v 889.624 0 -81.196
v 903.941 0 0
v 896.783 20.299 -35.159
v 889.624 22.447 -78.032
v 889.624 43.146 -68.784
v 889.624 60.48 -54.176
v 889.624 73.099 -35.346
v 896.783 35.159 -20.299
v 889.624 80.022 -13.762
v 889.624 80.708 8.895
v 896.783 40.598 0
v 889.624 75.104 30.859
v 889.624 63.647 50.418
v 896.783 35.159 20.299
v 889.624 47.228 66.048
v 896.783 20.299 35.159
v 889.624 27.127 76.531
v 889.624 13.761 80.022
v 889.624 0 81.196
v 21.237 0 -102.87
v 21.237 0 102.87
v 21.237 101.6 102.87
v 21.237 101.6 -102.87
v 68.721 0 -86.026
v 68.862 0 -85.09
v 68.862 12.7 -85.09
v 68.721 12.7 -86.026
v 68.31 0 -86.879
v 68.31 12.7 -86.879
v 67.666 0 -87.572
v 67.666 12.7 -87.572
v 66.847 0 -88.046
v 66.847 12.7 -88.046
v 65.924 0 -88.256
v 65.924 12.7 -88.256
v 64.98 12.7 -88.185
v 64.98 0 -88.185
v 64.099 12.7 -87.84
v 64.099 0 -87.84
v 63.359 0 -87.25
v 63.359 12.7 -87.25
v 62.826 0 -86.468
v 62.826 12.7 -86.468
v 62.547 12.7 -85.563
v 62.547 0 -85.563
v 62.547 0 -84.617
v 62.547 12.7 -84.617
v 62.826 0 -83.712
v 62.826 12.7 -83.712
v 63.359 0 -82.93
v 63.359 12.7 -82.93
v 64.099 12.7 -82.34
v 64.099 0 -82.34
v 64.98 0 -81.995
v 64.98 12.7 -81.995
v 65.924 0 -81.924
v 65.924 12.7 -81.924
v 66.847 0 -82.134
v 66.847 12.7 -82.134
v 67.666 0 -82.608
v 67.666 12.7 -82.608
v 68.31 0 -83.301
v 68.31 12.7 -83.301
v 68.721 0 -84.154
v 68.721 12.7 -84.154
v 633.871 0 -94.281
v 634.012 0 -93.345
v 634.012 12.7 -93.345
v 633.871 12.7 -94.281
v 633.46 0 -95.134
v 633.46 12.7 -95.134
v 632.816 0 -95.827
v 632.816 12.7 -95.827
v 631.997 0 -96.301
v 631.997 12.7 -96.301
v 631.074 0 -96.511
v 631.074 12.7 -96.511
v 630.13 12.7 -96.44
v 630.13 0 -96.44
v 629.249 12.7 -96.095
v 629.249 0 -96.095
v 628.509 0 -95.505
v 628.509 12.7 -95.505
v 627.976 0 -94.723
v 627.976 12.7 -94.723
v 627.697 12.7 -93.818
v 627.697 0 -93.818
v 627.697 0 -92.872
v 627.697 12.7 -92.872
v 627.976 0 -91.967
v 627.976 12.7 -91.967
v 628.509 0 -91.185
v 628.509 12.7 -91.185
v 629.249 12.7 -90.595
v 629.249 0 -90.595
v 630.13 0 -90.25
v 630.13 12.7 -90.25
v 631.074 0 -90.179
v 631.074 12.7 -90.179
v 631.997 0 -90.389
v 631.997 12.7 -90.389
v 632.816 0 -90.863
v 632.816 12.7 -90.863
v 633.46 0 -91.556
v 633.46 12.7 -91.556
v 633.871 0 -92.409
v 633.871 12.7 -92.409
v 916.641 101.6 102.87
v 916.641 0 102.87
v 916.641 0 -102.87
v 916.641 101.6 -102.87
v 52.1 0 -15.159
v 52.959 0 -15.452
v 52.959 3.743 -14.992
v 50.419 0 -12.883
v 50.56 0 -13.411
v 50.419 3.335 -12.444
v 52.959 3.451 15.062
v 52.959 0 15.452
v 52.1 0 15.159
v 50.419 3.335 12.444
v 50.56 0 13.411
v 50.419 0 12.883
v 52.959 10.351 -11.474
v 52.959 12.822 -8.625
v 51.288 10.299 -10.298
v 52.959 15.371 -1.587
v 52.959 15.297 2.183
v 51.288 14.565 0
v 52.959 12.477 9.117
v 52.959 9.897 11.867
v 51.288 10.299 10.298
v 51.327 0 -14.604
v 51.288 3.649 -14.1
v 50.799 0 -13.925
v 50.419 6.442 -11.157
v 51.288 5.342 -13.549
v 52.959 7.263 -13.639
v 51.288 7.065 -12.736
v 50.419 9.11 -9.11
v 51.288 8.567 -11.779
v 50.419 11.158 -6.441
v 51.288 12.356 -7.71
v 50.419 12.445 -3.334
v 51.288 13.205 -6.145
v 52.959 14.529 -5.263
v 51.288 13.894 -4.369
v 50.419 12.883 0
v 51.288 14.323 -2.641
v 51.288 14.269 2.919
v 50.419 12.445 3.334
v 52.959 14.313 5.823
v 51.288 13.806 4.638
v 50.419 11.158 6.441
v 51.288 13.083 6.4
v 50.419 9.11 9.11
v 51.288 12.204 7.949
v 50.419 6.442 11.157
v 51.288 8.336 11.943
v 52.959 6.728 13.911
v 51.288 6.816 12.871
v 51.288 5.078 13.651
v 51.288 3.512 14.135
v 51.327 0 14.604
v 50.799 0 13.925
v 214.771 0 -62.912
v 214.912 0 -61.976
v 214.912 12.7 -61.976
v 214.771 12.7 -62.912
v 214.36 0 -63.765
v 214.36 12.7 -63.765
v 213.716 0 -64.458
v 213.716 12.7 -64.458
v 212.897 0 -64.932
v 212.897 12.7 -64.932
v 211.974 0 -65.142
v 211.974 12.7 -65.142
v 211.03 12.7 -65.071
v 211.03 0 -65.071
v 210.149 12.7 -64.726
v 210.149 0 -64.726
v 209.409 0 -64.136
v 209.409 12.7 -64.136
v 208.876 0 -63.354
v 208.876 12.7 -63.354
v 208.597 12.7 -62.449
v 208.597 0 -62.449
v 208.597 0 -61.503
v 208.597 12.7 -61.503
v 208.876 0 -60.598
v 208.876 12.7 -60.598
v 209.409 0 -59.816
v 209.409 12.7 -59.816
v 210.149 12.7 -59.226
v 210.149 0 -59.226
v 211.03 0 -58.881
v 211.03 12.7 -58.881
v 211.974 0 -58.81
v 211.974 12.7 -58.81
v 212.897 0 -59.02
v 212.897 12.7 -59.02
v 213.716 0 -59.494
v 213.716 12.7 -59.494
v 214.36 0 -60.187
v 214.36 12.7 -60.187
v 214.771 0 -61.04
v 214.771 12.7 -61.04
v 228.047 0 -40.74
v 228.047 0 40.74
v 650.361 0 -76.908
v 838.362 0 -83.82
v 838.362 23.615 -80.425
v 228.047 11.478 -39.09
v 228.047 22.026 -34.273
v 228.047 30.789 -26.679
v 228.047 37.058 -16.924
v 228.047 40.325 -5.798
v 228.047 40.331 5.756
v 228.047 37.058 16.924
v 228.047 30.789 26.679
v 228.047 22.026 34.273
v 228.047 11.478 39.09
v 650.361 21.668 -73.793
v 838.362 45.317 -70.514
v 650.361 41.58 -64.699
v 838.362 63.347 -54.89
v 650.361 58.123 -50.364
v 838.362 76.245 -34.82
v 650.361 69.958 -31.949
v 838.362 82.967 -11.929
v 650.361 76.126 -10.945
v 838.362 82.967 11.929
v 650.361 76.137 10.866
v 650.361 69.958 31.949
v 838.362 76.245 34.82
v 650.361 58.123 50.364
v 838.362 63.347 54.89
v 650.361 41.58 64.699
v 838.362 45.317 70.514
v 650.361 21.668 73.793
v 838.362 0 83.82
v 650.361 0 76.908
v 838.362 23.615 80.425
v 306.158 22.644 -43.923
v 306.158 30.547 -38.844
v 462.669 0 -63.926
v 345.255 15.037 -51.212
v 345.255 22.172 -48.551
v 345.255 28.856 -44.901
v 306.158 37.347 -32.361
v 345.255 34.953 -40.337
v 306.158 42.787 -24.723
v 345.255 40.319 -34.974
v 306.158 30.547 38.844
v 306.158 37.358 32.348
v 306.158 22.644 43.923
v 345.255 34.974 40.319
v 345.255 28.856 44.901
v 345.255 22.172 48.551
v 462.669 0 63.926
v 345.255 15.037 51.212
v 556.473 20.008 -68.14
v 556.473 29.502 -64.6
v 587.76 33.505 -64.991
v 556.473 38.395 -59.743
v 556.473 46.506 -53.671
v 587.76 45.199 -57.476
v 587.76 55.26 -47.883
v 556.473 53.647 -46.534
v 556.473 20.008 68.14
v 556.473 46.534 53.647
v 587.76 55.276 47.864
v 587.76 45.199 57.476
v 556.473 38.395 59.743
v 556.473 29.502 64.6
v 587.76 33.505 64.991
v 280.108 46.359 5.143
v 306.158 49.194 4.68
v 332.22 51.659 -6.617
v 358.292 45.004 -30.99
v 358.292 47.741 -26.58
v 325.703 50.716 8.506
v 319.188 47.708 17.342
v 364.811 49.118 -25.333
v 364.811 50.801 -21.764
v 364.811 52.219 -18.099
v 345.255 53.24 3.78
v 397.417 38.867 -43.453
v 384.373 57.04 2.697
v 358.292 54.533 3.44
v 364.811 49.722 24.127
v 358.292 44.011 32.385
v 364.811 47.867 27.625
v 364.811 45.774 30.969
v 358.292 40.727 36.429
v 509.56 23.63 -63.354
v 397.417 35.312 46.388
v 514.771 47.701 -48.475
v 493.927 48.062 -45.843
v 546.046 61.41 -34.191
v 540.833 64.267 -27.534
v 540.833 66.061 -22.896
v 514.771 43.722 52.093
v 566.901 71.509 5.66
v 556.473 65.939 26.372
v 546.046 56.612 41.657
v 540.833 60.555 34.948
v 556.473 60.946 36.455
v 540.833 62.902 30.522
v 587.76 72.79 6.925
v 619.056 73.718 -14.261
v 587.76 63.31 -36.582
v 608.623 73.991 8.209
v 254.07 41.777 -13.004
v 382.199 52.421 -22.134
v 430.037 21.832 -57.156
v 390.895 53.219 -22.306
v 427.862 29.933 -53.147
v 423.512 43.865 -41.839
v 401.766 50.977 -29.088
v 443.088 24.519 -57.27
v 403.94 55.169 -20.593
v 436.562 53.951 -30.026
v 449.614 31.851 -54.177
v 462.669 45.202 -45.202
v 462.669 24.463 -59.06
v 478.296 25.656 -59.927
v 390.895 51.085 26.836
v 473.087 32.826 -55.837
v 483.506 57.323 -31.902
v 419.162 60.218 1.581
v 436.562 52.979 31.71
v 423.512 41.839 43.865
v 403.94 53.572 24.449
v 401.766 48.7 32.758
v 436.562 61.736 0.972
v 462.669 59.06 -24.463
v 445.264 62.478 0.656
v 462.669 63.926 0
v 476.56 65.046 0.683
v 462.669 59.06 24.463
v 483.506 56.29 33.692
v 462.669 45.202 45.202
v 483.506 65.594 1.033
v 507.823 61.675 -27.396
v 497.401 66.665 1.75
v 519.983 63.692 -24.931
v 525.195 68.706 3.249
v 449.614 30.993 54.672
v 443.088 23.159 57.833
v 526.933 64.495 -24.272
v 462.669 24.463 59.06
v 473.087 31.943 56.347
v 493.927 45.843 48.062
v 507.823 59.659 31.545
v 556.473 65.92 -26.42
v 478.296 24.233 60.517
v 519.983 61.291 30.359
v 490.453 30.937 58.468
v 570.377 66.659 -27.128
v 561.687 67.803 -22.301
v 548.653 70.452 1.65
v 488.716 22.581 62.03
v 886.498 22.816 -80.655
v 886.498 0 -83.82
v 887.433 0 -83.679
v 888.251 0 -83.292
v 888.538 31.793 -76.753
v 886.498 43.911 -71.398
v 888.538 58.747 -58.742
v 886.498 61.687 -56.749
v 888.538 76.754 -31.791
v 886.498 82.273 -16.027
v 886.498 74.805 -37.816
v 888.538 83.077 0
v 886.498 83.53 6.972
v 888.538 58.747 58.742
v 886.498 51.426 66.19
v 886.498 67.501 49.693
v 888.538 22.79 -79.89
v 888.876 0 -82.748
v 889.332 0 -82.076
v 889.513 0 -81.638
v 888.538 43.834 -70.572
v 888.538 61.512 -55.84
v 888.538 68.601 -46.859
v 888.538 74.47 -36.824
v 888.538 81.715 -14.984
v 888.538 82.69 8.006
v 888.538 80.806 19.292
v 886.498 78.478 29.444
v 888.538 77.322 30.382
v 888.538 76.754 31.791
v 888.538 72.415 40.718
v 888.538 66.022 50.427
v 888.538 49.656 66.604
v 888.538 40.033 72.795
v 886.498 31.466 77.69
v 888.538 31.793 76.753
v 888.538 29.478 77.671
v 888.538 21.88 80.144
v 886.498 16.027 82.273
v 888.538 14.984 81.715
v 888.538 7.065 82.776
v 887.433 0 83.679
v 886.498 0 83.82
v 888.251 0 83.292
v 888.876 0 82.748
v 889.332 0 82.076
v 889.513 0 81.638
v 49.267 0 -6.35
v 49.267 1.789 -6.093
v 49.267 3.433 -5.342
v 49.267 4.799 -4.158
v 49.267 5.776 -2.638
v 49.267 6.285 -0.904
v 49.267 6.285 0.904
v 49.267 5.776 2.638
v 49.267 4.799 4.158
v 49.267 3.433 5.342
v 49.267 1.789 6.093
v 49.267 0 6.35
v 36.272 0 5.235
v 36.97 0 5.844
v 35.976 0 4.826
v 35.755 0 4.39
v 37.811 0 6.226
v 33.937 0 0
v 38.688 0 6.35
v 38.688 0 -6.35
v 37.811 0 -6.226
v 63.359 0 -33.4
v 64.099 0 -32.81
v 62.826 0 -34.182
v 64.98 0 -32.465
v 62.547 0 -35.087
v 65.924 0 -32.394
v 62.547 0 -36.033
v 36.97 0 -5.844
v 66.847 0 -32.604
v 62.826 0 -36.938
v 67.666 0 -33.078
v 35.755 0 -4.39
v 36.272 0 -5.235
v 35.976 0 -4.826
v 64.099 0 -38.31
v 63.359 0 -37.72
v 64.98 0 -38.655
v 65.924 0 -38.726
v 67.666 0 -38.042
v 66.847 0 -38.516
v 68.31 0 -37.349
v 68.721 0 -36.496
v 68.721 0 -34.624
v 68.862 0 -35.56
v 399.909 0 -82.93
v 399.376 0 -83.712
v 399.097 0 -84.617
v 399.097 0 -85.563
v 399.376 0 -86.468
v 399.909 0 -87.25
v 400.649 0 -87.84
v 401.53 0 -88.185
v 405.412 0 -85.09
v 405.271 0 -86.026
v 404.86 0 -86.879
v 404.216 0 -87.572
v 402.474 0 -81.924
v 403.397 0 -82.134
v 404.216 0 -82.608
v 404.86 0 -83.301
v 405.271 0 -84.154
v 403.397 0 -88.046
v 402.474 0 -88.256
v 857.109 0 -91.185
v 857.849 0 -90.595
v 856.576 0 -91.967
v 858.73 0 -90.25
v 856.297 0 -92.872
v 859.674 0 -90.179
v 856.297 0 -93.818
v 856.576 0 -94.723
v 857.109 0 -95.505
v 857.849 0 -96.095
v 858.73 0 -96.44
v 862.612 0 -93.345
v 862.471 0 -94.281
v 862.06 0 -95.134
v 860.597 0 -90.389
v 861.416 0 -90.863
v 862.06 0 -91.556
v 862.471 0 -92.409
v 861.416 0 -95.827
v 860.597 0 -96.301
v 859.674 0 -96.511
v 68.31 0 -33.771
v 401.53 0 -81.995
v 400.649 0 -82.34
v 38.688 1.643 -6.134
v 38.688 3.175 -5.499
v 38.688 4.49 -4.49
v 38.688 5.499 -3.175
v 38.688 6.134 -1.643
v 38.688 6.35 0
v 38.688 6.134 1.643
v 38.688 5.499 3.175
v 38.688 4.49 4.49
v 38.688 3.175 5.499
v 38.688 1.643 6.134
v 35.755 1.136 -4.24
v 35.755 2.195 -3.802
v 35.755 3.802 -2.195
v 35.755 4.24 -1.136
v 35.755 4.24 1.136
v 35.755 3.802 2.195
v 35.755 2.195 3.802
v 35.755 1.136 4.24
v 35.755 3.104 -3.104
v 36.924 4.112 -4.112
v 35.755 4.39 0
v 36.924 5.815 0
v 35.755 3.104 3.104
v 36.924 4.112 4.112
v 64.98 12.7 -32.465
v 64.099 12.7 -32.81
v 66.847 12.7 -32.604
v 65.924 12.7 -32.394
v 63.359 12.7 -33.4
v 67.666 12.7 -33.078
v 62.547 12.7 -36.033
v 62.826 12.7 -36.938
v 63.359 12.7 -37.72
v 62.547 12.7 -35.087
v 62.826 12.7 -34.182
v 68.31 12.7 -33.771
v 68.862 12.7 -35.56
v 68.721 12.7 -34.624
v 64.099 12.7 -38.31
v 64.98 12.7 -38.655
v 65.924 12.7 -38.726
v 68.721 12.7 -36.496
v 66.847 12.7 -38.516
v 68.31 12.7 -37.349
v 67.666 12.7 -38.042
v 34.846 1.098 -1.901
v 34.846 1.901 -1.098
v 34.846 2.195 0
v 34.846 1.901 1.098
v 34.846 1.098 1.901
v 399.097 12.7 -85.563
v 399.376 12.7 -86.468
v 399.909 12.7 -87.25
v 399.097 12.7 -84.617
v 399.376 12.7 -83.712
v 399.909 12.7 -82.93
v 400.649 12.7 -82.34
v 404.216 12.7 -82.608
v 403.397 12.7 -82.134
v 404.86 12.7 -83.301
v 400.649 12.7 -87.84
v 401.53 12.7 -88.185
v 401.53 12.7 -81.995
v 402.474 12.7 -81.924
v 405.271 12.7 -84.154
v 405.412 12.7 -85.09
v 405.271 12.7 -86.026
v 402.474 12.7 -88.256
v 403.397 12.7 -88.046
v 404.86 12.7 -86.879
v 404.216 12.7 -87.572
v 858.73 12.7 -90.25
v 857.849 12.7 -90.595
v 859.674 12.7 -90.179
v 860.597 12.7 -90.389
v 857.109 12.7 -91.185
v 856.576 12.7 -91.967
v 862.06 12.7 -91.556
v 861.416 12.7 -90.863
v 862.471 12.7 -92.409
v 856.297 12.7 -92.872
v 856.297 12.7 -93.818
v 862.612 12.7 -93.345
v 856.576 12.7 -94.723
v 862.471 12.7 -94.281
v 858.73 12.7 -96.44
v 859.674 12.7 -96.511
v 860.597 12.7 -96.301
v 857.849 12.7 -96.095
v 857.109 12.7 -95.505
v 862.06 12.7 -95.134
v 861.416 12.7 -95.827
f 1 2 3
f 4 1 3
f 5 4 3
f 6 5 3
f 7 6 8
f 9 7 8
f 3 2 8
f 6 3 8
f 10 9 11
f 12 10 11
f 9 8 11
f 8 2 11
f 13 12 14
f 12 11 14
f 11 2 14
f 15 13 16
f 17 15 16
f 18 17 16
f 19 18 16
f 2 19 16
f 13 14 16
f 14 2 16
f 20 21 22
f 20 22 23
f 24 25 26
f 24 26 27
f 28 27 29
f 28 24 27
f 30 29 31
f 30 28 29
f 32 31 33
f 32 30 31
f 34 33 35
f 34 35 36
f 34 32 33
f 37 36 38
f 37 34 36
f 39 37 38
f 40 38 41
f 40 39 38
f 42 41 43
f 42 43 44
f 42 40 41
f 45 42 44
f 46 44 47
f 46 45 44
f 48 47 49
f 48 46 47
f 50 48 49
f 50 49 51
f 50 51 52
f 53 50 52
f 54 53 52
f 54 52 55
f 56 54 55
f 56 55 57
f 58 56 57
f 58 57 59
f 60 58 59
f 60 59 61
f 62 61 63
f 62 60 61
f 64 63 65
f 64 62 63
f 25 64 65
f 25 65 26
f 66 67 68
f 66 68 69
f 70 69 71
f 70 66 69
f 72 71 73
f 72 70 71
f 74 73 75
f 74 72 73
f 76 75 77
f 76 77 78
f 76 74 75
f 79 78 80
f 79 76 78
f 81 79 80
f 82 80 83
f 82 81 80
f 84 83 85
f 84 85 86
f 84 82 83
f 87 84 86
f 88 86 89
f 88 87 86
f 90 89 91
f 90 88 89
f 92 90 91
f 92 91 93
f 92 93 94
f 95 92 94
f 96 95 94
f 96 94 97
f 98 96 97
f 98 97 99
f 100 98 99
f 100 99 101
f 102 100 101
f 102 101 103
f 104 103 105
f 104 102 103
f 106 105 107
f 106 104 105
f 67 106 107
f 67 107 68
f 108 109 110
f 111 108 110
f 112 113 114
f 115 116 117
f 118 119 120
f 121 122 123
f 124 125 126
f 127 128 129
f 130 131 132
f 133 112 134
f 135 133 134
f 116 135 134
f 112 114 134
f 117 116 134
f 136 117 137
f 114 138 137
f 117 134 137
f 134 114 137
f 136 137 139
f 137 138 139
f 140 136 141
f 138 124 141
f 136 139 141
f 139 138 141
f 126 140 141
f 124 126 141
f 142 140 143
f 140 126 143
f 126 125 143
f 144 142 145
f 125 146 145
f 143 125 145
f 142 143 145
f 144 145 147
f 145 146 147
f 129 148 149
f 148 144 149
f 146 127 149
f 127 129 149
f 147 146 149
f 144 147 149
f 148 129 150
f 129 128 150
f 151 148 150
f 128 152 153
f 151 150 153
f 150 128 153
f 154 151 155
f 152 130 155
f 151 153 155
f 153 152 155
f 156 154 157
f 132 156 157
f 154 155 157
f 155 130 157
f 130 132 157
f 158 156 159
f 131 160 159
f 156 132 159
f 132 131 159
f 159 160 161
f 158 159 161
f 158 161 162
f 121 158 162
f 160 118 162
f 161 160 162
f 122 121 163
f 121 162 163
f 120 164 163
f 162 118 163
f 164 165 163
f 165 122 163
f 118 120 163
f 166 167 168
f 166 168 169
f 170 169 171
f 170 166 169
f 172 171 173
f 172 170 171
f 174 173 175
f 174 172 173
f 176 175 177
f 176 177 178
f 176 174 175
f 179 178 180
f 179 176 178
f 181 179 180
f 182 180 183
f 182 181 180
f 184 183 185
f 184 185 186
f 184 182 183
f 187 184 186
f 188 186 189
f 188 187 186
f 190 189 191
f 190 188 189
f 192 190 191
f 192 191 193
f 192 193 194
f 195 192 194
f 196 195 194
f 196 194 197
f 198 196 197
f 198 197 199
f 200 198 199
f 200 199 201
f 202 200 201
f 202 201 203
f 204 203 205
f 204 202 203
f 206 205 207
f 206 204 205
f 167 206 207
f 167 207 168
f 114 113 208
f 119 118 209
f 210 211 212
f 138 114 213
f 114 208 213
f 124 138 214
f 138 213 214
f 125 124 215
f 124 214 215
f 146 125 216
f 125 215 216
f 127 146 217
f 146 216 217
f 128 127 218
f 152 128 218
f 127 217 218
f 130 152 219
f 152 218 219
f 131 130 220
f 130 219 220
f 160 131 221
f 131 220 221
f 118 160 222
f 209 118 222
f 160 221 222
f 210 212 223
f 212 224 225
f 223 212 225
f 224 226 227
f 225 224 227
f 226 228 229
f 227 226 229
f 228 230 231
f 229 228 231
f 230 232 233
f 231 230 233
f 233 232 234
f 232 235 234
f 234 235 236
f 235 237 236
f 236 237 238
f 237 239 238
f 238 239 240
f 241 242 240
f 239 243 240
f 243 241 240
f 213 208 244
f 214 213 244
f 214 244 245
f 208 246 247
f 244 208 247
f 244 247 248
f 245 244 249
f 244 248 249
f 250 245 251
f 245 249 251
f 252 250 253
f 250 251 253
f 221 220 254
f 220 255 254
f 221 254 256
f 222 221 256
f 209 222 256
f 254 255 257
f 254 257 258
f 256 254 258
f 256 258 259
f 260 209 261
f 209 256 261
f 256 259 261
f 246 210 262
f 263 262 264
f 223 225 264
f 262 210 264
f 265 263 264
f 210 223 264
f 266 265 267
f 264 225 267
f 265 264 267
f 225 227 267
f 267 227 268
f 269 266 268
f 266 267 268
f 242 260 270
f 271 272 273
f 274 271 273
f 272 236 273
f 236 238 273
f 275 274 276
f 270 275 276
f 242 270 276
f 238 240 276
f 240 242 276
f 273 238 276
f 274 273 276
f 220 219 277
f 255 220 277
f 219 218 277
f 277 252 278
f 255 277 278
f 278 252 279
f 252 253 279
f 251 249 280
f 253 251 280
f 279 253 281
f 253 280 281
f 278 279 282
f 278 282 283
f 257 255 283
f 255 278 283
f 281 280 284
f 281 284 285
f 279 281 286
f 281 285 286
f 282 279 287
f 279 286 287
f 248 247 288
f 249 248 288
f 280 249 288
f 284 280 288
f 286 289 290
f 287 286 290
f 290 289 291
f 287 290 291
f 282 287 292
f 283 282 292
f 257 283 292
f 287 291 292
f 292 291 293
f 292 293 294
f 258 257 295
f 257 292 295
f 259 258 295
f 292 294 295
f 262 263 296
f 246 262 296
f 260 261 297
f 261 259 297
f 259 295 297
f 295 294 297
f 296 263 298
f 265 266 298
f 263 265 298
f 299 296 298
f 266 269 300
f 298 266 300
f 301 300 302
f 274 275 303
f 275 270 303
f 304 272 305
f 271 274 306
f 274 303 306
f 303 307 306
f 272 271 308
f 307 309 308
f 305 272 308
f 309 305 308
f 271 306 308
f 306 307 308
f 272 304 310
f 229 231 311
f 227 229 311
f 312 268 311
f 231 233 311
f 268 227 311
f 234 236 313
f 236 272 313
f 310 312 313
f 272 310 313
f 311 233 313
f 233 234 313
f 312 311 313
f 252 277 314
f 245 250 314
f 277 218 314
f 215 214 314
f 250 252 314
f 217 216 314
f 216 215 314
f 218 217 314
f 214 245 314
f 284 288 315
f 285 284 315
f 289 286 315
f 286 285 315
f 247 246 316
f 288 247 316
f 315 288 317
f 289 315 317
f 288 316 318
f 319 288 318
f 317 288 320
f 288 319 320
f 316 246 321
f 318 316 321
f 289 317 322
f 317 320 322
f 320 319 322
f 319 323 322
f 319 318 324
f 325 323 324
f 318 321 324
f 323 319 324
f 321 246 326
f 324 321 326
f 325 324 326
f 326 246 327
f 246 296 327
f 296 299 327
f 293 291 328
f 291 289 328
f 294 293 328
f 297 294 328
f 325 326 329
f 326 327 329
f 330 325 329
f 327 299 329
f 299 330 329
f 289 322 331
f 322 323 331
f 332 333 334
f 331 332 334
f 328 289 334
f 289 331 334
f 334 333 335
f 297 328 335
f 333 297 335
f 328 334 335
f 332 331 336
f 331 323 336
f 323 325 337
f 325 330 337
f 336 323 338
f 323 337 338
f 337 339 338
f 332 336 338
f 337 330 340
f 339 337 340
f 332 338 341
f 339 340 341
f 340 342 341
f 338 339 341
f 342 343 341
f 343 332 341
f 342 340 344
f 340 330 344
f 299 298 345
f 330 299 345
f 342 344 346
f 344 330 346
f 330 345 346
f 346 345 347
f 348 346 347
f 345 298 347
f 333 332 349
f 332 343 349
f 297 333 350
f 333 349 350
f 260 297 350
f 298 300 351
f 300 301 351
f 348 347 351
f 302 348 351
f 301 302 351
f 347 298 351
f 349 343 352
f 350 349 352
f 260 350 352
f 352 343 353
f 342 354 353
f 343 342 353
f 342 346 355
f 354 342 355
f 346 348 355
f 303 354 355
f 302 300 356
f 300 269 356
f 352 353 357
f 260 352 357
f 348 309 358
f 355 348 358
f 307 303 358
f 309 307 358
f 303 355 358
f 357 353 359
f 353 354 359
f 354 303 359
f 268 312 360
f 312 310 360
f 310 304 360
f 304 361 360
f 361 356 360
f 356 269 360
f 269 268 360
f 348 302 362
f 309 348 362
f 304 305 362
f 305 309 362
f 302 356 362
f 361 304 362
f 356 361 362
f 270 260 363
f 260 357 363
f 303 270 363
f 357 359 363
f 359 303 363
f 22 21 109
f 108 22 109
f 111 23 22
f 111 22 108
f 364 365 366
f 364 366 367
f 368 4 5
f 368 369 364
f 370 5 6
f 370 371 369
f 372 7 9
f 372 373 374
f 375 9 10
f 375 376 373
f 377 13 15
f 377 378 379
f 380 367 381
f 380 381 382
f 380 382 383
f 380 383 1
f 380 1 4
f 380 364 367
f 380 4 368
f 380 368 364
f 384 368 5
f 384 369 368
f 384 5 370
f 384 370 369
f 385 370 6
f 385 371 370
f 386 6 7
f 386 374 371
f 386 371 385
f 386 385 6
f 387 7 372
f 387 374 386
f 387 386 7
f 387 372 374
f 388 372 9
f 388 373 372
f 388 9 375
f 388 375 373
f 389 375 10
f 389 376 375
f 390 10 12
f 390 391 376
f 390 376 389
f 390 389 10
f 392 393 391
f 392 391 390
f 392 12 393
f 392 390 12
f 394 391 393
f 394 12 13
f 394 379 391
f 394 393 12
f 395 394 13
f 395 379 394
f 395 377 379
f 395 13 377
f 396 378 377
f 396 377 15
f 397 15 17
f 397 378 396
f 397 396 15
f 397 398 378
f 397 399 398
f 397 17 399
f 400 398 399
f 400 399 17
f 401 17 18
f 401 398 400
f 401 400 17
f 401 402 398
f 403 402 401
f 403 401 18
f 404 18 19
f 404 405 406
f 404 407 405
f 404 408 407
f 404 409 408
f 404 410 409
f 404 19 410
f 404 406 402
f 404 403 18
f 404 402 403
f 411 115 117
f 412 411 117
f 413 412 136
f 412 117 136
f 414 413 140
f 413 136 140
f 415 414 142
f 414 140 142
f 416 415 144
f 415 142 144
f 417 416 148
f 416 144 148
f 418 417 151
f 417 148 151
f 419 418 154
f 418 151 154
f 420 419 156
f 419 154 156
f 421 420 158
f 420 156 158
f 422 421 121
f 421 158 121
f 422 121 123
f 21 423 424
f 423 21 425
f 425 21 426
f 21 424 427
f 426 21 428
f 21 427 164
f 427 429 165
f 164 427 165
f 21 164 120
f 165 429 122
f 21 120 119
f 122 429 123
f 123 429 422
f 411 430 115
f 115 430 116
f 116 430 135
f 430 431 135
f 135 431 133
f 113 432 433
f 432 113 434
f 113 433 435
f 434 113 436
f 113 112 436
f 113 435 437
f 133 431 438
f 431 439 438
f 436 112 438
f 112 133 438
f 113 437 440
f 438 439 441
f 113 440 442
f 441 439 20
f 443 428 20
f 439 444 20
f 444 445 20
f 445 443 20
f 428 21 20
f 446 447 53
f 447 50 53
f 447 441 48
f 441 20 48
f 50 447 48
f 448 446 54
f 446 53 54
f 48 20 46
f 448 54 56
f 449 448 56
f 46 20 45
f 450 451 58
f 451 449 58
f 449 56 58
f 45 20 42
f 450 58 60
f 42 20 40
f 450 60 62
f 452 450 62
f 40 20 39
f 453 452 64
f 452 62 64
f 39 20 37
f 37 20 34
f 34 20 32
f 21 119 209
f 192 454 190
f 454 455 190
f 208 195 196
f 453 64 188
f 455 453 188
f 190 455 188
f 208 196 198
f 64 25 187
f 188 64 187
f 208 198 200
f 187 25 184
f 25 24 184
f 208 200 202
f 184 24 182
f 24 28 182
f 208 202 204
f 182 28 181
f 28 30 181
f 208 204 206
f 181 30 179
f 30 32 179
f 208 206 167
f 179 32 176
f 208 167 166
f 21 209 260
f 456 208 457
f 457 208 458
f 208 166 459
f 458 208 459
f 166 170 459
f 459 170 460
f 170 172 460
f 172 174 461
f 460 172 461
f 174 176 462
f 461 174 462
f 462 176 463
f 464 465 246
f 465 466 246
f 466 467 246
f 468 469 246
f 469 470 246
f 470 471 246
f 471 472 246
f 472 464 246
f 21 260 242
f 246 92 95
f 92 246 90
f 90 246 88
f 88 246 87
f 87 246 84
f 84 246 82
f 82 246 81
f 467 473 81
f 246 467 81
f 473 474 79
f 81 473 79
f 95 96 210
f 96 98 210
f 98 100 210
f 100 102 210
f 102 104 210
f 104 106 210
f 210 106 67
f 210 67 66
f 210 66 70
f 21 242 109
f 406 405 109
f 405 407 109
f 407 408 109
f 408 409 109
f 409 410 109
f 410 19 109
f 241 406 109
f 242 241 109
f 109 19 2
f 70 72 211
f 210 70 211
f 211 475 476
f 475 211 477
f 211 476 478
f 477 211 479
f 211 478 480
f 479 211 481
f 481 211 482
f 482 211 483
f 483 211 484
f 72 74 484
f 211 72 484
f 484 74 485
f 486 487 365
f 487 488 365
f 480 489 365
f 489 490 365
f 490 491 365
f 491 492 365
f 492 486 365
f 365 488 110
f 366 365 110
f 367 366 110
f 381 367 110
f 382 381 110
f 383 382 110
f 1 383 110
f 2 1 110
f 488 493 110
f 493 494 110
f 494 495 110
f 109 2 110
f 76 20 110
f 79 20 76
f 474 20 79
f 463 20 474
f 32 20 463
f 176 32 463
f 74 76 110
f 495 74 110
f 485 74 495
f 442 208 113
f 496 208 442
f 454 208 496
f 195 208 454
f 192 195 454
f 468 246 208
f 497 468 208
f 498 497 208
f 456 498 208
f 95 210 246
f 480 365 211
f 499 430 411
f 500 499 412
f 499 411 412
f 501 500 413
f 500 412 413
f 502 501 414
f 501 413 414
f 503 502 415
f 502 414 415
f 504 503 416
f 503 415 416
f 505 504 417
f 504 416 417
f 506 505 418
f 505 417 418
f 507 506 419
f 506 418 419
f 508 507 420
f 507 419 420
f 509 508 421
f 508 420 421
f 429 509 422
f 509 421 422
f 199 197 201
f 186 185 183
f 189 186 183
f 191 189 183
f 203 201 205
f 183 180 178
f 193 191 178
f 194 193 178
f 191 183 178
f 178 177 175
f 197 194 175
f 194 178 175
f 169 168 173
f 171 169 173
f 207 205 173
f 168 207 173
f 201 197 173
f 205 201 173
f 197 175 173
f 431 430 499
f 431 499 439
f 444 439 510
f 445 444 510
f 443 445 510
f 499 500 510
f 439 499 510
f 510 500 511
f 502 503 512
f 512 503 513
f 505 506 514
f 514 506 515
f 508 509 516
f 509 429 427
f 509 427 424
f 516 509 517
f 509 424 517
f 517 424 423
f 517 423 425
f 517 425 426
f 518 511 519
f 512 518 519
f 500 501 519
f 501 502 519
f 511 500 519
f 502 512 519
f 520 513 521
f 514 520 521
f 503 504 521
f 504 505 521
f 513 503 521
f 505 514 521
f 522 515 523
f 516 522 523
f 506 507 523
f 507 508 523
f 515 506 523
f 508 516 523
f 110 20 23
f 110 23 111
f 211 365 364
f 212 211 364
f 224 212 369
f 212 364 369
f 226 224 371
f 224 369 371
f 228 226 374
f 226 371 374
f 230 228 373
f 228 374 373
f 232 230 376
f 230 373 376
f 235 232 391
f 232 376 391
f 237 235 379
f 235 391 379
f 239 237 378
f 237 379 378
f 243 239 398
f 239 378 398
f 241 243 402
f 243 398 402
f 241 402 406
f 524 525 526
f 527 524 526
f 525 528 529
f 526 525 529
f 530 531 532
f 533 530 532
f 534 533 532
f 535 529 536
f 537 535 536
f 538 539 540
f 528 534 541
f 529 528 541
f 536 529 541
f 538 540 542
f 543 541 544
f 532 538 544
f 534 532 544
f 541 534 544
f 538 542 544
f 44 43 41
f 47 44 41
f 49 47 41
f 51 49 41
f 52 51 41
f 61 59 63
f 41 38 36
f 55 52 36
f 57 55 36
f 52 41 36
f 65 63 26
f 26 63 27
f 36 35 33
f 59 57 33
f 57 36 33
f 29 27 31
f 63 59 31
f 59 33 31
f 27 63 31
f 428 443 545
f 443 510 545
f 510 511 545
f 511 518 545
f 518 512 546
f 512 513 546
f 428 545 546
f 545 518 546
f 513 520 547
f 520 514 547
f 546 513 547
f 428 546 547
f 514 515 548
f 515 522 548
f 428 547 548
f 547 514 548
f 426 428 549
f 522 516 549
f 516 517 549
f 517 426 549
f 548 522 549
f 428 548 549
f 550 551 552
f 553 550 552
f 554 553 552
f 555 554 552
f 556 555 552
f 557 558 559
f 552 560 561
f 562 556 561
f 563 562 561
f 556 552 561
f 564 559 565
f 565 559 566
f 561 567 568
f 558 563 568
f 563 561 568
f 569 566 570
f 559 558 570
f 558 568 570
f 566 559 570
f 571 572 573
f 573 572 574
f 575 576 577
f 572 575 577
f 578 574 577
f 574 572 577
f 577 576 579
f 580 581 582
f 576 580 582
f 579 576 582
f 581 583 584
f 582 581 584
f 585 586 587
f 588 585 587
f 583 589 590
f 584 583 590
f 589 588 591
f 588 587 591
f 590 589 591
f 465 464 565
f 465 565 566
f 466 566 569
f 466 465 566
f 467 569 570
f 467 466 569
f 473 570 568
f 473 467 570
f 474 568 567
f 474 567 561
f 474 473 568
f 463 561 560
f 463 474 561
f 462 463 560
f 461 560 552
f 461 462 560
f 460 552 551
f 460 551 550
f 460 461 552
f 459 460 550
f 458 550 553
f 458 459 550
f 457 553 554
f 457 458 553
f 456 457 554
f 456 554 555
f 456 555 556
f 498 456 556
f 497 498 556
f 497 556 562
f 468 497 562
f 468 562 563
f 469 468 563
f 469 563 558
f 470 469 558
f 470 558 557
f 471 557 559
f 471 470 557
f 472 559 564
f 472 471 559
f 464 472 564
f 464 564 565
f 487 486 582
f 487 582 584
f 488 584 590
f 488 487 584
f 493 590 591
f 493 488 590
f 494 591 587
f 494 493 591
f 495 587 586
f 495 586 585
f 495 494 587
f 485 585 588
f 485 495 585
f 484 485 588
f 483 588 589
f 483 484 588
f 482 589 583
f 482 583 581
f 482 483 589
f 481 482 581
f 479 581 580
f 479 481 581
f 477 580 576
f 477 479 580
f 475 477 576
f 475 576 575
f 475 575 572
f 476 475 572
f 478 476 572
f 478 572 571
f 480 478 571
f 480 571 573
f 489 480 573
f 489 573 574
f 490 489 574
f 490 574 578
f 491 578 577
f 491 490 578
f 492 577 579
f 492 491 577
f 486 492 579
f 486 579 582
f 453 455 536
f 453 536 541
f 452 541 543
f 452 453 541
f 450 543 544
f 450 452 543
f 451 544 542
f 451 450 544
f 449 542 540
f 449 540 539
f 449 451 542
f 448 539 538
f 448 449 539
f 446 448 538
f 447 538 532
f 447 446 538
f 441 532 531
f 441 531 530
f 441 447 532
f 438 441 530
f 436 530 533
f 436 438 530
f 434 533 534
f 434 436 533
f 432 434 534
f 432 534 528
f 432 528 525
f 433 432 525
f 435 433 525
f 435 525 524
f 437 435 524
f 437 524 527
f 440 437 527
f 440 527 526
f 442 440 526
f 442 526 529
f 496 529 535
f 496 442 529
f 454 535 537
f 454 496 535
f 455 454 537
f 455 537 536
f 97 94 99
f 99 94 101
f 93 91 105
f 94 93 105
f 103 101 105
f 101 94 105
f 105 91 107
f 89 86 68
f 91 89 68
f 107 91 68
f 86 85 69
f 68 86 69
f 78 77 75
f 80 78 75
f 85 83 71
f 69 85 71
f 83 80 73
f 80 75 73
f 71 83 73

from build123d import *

# Parameters (mm, degrees)
REVOLVE1_ANGLE         = 180
SKETCH5_W              = 895.40473358
SKETCH5_H              = 205.74
BOSS_EXTRUDE1_DEPTH    = 38.1
SKETCH9_W              = 895.40473358
SKETCH9_H              = 205.74
BOSS_EXTRUDE5_DEPTH    = 101.6
FILLET1_R              = 3.175
CUT_EXTRUDE1_OUTLINE_R = 3.175
CUT_EXTRUDE1_DEPTH     = 12.7


# Read off the part's stored shape, not the designer's step: Cut-Extrude1
with BuildPart() as part:
    # Sketch4 → Revolve1 (revolve)
    with BuildSketch(Plane(origin=(0, 0, 0), x_dir=(1, 0, 0), z_dir=(0, 1, 0))):
        with BuildLine():
            Line((838.361715067, 83.82), (889.161715067, 83.82))
            Line((889.161715067, 83.82), (903.94144259, 0))
            Line((903.94144259, 0), (33.93670901, 0))
            Line((33.93670901, 0), (36.566965131, 6.35))
            Line((36.566965131, 6.35), (49.266965131, 6.35))
            Line((49.266965131, 6.35), (50.8, 15.04427278))
            add(Edge.make_bspline(
                [(50.8, 15.04427278), (51.625271193, 15.201290881), (53.251330207, 15.508536828), (57.124119543, 16.232931828), (62.146237859, 17.146971323), (68.468865546, 18.271630494), (77.104805357, 19.759299021), (87.563136705, 21.501230362), (99.596217659, 23.425244589), (111.661947143, 25.278307663), (121.972557789, 26.811740179), (132.310247749, 28.314515819), (142.640819969, 29.78211892), (154.707618563, 31.451577511), (168.50058462, 33.303205201), (182.303059594, 35.104467069), (196.110093108, 36.858246399), (213.376725128, 38.995527561), (234.106301617, 41.477276739), (258.304205533, 44.261664544), (282.515559062, 46.924534133), (303.276895107, 49.126678738), (324.044555274, 51.267518561), (344.81831943, 53.348832955), (369.062594865, 55.693564026), (396.78074426, 58.263492413), (424.508528664, 60.72715323), (452.245340769, 63.087037809), (479.990655319, 65.344703609), (507.744043491, 67.50088036), (535.505139038, 69.555419915), (570.215765491, 71.995364991), (611.882821301, 74.714193718), (660.514345839, 77.568482026), (705.693597747, 79.827536832), (740.458993877, 81.299277883), (764.800431333, 82.180653766), (778.711441945, 82.6371517), (793.992125907, 83.081992109), (808.219629905, 83.426024247), (821.393522916, 83.6742739), (831.089402446, 83.787712376), (835.937585304, 83.82), (838.361715067, 83.82)],
                knots=[0.061800805, 0.061800805, 0.061800805, 0.061800805, 0.061800805, 0.066047901, 0.070294997, 0.078789189, 0.087283381, 0.095777573, 0.112282002, 0.12878643, 0.145290859, 0.153543073, 0.161795288, 0.178299717, 0.194804145, 0.211308574, 0.227813002, 0.244317431, 0.26082186, 0.293830717, 0.326839575, 0.359848434, 0.376352863, 0.392857292, 0.42586615, 0.458875008, 0.491883866, 0.524892724, 0.557901583, 0.590910441, 0.623919299, 0.656928157, 0.689937015, 0.755954731, 0.821972448, 0.887990163, 0.904494593, 0.920999022, 0.937503451, 0.95400788, 0.97700394, 0.98850197, 1, 1, 1, 1, 1], degree=4))
        make_face()
    revolve(axis=Axis((0, 0, 0), (1, 0, 0)), revolution_arc=REVOLVE1_ANGLE)

    # Sketch5 → Boss-Extrude1 (add)
    with BuildSketch(Plane.XZ):
        with Locations((468.9390758, 0)):
            Rectangle(SKETCH5_W, SKETCH5_H)
    extrude(amount=BOSS_EXTRUDE1_DEPTH)


with BuildPart() as body_2:
    # Sketch9 → Boss-Extrude5 (new body)
    with BuildSketch(Plane(origin=(0, 0, 0), x_dir=(1, 0, 0), z_dir=(0, 1, 0))):
        with Locations((468.9390758, 0)):
            Rectangle(SKETCH9_W, SKETCH9_H)
    extrude(amount=BOSS_EXTRUDE5_DEPTH)

    # Combine1: cut part
    add(part.part, mode=Mode.SUBTRACT)

    # Fillet1
    fillet1_edges = [body_2.edges().sort_by_distance(p)[0] for p in [
        (889.161715067, 83.82, 0),
        (50.8, 15.04427278, 0),
        (36.566965131, 6.35, 0),
    ]]
    fillet(fillet1_edges, radius=FILLET1_R)

    # Cut-Extrude1 outline → Cut-Extrude1 (cut)
    with BuildSketch(Plane(origin=(0, 0, 0), x_dir=(1, 0, 0), z_dir=(0, 1, 0))):
        with Locations((65.68670901, 35.56)):
            Circle(CUT_EXTRUDE1_OUTLINE_R)
        with Locations((402.23670901, 85.09)):
            Circle(CUT_EXTRUDE1_OUTLINE_R)
        with Locations((630.83670901, 93.345)):
            Circle(CUT_EXTRUDE1_OUTLINE_R)
        with Locations((211.73670901, 61.976)):
            Circle(CUT_EXTRUDE1_OUTLINE_R)
        with Locations((65.68670901, 85.09)):
            Circle(CUT_EXTRUDE1_OUTLINE_R)
        with Locations((859.43670901, 93.345)):
            Circle(CUT_EXTRUDE1_OUTLINE_R)
    extrude(amount=CUT_EXTRUDE1_DEPTH, mode=Mode.SUBTRACT)


solid = body_2.part
